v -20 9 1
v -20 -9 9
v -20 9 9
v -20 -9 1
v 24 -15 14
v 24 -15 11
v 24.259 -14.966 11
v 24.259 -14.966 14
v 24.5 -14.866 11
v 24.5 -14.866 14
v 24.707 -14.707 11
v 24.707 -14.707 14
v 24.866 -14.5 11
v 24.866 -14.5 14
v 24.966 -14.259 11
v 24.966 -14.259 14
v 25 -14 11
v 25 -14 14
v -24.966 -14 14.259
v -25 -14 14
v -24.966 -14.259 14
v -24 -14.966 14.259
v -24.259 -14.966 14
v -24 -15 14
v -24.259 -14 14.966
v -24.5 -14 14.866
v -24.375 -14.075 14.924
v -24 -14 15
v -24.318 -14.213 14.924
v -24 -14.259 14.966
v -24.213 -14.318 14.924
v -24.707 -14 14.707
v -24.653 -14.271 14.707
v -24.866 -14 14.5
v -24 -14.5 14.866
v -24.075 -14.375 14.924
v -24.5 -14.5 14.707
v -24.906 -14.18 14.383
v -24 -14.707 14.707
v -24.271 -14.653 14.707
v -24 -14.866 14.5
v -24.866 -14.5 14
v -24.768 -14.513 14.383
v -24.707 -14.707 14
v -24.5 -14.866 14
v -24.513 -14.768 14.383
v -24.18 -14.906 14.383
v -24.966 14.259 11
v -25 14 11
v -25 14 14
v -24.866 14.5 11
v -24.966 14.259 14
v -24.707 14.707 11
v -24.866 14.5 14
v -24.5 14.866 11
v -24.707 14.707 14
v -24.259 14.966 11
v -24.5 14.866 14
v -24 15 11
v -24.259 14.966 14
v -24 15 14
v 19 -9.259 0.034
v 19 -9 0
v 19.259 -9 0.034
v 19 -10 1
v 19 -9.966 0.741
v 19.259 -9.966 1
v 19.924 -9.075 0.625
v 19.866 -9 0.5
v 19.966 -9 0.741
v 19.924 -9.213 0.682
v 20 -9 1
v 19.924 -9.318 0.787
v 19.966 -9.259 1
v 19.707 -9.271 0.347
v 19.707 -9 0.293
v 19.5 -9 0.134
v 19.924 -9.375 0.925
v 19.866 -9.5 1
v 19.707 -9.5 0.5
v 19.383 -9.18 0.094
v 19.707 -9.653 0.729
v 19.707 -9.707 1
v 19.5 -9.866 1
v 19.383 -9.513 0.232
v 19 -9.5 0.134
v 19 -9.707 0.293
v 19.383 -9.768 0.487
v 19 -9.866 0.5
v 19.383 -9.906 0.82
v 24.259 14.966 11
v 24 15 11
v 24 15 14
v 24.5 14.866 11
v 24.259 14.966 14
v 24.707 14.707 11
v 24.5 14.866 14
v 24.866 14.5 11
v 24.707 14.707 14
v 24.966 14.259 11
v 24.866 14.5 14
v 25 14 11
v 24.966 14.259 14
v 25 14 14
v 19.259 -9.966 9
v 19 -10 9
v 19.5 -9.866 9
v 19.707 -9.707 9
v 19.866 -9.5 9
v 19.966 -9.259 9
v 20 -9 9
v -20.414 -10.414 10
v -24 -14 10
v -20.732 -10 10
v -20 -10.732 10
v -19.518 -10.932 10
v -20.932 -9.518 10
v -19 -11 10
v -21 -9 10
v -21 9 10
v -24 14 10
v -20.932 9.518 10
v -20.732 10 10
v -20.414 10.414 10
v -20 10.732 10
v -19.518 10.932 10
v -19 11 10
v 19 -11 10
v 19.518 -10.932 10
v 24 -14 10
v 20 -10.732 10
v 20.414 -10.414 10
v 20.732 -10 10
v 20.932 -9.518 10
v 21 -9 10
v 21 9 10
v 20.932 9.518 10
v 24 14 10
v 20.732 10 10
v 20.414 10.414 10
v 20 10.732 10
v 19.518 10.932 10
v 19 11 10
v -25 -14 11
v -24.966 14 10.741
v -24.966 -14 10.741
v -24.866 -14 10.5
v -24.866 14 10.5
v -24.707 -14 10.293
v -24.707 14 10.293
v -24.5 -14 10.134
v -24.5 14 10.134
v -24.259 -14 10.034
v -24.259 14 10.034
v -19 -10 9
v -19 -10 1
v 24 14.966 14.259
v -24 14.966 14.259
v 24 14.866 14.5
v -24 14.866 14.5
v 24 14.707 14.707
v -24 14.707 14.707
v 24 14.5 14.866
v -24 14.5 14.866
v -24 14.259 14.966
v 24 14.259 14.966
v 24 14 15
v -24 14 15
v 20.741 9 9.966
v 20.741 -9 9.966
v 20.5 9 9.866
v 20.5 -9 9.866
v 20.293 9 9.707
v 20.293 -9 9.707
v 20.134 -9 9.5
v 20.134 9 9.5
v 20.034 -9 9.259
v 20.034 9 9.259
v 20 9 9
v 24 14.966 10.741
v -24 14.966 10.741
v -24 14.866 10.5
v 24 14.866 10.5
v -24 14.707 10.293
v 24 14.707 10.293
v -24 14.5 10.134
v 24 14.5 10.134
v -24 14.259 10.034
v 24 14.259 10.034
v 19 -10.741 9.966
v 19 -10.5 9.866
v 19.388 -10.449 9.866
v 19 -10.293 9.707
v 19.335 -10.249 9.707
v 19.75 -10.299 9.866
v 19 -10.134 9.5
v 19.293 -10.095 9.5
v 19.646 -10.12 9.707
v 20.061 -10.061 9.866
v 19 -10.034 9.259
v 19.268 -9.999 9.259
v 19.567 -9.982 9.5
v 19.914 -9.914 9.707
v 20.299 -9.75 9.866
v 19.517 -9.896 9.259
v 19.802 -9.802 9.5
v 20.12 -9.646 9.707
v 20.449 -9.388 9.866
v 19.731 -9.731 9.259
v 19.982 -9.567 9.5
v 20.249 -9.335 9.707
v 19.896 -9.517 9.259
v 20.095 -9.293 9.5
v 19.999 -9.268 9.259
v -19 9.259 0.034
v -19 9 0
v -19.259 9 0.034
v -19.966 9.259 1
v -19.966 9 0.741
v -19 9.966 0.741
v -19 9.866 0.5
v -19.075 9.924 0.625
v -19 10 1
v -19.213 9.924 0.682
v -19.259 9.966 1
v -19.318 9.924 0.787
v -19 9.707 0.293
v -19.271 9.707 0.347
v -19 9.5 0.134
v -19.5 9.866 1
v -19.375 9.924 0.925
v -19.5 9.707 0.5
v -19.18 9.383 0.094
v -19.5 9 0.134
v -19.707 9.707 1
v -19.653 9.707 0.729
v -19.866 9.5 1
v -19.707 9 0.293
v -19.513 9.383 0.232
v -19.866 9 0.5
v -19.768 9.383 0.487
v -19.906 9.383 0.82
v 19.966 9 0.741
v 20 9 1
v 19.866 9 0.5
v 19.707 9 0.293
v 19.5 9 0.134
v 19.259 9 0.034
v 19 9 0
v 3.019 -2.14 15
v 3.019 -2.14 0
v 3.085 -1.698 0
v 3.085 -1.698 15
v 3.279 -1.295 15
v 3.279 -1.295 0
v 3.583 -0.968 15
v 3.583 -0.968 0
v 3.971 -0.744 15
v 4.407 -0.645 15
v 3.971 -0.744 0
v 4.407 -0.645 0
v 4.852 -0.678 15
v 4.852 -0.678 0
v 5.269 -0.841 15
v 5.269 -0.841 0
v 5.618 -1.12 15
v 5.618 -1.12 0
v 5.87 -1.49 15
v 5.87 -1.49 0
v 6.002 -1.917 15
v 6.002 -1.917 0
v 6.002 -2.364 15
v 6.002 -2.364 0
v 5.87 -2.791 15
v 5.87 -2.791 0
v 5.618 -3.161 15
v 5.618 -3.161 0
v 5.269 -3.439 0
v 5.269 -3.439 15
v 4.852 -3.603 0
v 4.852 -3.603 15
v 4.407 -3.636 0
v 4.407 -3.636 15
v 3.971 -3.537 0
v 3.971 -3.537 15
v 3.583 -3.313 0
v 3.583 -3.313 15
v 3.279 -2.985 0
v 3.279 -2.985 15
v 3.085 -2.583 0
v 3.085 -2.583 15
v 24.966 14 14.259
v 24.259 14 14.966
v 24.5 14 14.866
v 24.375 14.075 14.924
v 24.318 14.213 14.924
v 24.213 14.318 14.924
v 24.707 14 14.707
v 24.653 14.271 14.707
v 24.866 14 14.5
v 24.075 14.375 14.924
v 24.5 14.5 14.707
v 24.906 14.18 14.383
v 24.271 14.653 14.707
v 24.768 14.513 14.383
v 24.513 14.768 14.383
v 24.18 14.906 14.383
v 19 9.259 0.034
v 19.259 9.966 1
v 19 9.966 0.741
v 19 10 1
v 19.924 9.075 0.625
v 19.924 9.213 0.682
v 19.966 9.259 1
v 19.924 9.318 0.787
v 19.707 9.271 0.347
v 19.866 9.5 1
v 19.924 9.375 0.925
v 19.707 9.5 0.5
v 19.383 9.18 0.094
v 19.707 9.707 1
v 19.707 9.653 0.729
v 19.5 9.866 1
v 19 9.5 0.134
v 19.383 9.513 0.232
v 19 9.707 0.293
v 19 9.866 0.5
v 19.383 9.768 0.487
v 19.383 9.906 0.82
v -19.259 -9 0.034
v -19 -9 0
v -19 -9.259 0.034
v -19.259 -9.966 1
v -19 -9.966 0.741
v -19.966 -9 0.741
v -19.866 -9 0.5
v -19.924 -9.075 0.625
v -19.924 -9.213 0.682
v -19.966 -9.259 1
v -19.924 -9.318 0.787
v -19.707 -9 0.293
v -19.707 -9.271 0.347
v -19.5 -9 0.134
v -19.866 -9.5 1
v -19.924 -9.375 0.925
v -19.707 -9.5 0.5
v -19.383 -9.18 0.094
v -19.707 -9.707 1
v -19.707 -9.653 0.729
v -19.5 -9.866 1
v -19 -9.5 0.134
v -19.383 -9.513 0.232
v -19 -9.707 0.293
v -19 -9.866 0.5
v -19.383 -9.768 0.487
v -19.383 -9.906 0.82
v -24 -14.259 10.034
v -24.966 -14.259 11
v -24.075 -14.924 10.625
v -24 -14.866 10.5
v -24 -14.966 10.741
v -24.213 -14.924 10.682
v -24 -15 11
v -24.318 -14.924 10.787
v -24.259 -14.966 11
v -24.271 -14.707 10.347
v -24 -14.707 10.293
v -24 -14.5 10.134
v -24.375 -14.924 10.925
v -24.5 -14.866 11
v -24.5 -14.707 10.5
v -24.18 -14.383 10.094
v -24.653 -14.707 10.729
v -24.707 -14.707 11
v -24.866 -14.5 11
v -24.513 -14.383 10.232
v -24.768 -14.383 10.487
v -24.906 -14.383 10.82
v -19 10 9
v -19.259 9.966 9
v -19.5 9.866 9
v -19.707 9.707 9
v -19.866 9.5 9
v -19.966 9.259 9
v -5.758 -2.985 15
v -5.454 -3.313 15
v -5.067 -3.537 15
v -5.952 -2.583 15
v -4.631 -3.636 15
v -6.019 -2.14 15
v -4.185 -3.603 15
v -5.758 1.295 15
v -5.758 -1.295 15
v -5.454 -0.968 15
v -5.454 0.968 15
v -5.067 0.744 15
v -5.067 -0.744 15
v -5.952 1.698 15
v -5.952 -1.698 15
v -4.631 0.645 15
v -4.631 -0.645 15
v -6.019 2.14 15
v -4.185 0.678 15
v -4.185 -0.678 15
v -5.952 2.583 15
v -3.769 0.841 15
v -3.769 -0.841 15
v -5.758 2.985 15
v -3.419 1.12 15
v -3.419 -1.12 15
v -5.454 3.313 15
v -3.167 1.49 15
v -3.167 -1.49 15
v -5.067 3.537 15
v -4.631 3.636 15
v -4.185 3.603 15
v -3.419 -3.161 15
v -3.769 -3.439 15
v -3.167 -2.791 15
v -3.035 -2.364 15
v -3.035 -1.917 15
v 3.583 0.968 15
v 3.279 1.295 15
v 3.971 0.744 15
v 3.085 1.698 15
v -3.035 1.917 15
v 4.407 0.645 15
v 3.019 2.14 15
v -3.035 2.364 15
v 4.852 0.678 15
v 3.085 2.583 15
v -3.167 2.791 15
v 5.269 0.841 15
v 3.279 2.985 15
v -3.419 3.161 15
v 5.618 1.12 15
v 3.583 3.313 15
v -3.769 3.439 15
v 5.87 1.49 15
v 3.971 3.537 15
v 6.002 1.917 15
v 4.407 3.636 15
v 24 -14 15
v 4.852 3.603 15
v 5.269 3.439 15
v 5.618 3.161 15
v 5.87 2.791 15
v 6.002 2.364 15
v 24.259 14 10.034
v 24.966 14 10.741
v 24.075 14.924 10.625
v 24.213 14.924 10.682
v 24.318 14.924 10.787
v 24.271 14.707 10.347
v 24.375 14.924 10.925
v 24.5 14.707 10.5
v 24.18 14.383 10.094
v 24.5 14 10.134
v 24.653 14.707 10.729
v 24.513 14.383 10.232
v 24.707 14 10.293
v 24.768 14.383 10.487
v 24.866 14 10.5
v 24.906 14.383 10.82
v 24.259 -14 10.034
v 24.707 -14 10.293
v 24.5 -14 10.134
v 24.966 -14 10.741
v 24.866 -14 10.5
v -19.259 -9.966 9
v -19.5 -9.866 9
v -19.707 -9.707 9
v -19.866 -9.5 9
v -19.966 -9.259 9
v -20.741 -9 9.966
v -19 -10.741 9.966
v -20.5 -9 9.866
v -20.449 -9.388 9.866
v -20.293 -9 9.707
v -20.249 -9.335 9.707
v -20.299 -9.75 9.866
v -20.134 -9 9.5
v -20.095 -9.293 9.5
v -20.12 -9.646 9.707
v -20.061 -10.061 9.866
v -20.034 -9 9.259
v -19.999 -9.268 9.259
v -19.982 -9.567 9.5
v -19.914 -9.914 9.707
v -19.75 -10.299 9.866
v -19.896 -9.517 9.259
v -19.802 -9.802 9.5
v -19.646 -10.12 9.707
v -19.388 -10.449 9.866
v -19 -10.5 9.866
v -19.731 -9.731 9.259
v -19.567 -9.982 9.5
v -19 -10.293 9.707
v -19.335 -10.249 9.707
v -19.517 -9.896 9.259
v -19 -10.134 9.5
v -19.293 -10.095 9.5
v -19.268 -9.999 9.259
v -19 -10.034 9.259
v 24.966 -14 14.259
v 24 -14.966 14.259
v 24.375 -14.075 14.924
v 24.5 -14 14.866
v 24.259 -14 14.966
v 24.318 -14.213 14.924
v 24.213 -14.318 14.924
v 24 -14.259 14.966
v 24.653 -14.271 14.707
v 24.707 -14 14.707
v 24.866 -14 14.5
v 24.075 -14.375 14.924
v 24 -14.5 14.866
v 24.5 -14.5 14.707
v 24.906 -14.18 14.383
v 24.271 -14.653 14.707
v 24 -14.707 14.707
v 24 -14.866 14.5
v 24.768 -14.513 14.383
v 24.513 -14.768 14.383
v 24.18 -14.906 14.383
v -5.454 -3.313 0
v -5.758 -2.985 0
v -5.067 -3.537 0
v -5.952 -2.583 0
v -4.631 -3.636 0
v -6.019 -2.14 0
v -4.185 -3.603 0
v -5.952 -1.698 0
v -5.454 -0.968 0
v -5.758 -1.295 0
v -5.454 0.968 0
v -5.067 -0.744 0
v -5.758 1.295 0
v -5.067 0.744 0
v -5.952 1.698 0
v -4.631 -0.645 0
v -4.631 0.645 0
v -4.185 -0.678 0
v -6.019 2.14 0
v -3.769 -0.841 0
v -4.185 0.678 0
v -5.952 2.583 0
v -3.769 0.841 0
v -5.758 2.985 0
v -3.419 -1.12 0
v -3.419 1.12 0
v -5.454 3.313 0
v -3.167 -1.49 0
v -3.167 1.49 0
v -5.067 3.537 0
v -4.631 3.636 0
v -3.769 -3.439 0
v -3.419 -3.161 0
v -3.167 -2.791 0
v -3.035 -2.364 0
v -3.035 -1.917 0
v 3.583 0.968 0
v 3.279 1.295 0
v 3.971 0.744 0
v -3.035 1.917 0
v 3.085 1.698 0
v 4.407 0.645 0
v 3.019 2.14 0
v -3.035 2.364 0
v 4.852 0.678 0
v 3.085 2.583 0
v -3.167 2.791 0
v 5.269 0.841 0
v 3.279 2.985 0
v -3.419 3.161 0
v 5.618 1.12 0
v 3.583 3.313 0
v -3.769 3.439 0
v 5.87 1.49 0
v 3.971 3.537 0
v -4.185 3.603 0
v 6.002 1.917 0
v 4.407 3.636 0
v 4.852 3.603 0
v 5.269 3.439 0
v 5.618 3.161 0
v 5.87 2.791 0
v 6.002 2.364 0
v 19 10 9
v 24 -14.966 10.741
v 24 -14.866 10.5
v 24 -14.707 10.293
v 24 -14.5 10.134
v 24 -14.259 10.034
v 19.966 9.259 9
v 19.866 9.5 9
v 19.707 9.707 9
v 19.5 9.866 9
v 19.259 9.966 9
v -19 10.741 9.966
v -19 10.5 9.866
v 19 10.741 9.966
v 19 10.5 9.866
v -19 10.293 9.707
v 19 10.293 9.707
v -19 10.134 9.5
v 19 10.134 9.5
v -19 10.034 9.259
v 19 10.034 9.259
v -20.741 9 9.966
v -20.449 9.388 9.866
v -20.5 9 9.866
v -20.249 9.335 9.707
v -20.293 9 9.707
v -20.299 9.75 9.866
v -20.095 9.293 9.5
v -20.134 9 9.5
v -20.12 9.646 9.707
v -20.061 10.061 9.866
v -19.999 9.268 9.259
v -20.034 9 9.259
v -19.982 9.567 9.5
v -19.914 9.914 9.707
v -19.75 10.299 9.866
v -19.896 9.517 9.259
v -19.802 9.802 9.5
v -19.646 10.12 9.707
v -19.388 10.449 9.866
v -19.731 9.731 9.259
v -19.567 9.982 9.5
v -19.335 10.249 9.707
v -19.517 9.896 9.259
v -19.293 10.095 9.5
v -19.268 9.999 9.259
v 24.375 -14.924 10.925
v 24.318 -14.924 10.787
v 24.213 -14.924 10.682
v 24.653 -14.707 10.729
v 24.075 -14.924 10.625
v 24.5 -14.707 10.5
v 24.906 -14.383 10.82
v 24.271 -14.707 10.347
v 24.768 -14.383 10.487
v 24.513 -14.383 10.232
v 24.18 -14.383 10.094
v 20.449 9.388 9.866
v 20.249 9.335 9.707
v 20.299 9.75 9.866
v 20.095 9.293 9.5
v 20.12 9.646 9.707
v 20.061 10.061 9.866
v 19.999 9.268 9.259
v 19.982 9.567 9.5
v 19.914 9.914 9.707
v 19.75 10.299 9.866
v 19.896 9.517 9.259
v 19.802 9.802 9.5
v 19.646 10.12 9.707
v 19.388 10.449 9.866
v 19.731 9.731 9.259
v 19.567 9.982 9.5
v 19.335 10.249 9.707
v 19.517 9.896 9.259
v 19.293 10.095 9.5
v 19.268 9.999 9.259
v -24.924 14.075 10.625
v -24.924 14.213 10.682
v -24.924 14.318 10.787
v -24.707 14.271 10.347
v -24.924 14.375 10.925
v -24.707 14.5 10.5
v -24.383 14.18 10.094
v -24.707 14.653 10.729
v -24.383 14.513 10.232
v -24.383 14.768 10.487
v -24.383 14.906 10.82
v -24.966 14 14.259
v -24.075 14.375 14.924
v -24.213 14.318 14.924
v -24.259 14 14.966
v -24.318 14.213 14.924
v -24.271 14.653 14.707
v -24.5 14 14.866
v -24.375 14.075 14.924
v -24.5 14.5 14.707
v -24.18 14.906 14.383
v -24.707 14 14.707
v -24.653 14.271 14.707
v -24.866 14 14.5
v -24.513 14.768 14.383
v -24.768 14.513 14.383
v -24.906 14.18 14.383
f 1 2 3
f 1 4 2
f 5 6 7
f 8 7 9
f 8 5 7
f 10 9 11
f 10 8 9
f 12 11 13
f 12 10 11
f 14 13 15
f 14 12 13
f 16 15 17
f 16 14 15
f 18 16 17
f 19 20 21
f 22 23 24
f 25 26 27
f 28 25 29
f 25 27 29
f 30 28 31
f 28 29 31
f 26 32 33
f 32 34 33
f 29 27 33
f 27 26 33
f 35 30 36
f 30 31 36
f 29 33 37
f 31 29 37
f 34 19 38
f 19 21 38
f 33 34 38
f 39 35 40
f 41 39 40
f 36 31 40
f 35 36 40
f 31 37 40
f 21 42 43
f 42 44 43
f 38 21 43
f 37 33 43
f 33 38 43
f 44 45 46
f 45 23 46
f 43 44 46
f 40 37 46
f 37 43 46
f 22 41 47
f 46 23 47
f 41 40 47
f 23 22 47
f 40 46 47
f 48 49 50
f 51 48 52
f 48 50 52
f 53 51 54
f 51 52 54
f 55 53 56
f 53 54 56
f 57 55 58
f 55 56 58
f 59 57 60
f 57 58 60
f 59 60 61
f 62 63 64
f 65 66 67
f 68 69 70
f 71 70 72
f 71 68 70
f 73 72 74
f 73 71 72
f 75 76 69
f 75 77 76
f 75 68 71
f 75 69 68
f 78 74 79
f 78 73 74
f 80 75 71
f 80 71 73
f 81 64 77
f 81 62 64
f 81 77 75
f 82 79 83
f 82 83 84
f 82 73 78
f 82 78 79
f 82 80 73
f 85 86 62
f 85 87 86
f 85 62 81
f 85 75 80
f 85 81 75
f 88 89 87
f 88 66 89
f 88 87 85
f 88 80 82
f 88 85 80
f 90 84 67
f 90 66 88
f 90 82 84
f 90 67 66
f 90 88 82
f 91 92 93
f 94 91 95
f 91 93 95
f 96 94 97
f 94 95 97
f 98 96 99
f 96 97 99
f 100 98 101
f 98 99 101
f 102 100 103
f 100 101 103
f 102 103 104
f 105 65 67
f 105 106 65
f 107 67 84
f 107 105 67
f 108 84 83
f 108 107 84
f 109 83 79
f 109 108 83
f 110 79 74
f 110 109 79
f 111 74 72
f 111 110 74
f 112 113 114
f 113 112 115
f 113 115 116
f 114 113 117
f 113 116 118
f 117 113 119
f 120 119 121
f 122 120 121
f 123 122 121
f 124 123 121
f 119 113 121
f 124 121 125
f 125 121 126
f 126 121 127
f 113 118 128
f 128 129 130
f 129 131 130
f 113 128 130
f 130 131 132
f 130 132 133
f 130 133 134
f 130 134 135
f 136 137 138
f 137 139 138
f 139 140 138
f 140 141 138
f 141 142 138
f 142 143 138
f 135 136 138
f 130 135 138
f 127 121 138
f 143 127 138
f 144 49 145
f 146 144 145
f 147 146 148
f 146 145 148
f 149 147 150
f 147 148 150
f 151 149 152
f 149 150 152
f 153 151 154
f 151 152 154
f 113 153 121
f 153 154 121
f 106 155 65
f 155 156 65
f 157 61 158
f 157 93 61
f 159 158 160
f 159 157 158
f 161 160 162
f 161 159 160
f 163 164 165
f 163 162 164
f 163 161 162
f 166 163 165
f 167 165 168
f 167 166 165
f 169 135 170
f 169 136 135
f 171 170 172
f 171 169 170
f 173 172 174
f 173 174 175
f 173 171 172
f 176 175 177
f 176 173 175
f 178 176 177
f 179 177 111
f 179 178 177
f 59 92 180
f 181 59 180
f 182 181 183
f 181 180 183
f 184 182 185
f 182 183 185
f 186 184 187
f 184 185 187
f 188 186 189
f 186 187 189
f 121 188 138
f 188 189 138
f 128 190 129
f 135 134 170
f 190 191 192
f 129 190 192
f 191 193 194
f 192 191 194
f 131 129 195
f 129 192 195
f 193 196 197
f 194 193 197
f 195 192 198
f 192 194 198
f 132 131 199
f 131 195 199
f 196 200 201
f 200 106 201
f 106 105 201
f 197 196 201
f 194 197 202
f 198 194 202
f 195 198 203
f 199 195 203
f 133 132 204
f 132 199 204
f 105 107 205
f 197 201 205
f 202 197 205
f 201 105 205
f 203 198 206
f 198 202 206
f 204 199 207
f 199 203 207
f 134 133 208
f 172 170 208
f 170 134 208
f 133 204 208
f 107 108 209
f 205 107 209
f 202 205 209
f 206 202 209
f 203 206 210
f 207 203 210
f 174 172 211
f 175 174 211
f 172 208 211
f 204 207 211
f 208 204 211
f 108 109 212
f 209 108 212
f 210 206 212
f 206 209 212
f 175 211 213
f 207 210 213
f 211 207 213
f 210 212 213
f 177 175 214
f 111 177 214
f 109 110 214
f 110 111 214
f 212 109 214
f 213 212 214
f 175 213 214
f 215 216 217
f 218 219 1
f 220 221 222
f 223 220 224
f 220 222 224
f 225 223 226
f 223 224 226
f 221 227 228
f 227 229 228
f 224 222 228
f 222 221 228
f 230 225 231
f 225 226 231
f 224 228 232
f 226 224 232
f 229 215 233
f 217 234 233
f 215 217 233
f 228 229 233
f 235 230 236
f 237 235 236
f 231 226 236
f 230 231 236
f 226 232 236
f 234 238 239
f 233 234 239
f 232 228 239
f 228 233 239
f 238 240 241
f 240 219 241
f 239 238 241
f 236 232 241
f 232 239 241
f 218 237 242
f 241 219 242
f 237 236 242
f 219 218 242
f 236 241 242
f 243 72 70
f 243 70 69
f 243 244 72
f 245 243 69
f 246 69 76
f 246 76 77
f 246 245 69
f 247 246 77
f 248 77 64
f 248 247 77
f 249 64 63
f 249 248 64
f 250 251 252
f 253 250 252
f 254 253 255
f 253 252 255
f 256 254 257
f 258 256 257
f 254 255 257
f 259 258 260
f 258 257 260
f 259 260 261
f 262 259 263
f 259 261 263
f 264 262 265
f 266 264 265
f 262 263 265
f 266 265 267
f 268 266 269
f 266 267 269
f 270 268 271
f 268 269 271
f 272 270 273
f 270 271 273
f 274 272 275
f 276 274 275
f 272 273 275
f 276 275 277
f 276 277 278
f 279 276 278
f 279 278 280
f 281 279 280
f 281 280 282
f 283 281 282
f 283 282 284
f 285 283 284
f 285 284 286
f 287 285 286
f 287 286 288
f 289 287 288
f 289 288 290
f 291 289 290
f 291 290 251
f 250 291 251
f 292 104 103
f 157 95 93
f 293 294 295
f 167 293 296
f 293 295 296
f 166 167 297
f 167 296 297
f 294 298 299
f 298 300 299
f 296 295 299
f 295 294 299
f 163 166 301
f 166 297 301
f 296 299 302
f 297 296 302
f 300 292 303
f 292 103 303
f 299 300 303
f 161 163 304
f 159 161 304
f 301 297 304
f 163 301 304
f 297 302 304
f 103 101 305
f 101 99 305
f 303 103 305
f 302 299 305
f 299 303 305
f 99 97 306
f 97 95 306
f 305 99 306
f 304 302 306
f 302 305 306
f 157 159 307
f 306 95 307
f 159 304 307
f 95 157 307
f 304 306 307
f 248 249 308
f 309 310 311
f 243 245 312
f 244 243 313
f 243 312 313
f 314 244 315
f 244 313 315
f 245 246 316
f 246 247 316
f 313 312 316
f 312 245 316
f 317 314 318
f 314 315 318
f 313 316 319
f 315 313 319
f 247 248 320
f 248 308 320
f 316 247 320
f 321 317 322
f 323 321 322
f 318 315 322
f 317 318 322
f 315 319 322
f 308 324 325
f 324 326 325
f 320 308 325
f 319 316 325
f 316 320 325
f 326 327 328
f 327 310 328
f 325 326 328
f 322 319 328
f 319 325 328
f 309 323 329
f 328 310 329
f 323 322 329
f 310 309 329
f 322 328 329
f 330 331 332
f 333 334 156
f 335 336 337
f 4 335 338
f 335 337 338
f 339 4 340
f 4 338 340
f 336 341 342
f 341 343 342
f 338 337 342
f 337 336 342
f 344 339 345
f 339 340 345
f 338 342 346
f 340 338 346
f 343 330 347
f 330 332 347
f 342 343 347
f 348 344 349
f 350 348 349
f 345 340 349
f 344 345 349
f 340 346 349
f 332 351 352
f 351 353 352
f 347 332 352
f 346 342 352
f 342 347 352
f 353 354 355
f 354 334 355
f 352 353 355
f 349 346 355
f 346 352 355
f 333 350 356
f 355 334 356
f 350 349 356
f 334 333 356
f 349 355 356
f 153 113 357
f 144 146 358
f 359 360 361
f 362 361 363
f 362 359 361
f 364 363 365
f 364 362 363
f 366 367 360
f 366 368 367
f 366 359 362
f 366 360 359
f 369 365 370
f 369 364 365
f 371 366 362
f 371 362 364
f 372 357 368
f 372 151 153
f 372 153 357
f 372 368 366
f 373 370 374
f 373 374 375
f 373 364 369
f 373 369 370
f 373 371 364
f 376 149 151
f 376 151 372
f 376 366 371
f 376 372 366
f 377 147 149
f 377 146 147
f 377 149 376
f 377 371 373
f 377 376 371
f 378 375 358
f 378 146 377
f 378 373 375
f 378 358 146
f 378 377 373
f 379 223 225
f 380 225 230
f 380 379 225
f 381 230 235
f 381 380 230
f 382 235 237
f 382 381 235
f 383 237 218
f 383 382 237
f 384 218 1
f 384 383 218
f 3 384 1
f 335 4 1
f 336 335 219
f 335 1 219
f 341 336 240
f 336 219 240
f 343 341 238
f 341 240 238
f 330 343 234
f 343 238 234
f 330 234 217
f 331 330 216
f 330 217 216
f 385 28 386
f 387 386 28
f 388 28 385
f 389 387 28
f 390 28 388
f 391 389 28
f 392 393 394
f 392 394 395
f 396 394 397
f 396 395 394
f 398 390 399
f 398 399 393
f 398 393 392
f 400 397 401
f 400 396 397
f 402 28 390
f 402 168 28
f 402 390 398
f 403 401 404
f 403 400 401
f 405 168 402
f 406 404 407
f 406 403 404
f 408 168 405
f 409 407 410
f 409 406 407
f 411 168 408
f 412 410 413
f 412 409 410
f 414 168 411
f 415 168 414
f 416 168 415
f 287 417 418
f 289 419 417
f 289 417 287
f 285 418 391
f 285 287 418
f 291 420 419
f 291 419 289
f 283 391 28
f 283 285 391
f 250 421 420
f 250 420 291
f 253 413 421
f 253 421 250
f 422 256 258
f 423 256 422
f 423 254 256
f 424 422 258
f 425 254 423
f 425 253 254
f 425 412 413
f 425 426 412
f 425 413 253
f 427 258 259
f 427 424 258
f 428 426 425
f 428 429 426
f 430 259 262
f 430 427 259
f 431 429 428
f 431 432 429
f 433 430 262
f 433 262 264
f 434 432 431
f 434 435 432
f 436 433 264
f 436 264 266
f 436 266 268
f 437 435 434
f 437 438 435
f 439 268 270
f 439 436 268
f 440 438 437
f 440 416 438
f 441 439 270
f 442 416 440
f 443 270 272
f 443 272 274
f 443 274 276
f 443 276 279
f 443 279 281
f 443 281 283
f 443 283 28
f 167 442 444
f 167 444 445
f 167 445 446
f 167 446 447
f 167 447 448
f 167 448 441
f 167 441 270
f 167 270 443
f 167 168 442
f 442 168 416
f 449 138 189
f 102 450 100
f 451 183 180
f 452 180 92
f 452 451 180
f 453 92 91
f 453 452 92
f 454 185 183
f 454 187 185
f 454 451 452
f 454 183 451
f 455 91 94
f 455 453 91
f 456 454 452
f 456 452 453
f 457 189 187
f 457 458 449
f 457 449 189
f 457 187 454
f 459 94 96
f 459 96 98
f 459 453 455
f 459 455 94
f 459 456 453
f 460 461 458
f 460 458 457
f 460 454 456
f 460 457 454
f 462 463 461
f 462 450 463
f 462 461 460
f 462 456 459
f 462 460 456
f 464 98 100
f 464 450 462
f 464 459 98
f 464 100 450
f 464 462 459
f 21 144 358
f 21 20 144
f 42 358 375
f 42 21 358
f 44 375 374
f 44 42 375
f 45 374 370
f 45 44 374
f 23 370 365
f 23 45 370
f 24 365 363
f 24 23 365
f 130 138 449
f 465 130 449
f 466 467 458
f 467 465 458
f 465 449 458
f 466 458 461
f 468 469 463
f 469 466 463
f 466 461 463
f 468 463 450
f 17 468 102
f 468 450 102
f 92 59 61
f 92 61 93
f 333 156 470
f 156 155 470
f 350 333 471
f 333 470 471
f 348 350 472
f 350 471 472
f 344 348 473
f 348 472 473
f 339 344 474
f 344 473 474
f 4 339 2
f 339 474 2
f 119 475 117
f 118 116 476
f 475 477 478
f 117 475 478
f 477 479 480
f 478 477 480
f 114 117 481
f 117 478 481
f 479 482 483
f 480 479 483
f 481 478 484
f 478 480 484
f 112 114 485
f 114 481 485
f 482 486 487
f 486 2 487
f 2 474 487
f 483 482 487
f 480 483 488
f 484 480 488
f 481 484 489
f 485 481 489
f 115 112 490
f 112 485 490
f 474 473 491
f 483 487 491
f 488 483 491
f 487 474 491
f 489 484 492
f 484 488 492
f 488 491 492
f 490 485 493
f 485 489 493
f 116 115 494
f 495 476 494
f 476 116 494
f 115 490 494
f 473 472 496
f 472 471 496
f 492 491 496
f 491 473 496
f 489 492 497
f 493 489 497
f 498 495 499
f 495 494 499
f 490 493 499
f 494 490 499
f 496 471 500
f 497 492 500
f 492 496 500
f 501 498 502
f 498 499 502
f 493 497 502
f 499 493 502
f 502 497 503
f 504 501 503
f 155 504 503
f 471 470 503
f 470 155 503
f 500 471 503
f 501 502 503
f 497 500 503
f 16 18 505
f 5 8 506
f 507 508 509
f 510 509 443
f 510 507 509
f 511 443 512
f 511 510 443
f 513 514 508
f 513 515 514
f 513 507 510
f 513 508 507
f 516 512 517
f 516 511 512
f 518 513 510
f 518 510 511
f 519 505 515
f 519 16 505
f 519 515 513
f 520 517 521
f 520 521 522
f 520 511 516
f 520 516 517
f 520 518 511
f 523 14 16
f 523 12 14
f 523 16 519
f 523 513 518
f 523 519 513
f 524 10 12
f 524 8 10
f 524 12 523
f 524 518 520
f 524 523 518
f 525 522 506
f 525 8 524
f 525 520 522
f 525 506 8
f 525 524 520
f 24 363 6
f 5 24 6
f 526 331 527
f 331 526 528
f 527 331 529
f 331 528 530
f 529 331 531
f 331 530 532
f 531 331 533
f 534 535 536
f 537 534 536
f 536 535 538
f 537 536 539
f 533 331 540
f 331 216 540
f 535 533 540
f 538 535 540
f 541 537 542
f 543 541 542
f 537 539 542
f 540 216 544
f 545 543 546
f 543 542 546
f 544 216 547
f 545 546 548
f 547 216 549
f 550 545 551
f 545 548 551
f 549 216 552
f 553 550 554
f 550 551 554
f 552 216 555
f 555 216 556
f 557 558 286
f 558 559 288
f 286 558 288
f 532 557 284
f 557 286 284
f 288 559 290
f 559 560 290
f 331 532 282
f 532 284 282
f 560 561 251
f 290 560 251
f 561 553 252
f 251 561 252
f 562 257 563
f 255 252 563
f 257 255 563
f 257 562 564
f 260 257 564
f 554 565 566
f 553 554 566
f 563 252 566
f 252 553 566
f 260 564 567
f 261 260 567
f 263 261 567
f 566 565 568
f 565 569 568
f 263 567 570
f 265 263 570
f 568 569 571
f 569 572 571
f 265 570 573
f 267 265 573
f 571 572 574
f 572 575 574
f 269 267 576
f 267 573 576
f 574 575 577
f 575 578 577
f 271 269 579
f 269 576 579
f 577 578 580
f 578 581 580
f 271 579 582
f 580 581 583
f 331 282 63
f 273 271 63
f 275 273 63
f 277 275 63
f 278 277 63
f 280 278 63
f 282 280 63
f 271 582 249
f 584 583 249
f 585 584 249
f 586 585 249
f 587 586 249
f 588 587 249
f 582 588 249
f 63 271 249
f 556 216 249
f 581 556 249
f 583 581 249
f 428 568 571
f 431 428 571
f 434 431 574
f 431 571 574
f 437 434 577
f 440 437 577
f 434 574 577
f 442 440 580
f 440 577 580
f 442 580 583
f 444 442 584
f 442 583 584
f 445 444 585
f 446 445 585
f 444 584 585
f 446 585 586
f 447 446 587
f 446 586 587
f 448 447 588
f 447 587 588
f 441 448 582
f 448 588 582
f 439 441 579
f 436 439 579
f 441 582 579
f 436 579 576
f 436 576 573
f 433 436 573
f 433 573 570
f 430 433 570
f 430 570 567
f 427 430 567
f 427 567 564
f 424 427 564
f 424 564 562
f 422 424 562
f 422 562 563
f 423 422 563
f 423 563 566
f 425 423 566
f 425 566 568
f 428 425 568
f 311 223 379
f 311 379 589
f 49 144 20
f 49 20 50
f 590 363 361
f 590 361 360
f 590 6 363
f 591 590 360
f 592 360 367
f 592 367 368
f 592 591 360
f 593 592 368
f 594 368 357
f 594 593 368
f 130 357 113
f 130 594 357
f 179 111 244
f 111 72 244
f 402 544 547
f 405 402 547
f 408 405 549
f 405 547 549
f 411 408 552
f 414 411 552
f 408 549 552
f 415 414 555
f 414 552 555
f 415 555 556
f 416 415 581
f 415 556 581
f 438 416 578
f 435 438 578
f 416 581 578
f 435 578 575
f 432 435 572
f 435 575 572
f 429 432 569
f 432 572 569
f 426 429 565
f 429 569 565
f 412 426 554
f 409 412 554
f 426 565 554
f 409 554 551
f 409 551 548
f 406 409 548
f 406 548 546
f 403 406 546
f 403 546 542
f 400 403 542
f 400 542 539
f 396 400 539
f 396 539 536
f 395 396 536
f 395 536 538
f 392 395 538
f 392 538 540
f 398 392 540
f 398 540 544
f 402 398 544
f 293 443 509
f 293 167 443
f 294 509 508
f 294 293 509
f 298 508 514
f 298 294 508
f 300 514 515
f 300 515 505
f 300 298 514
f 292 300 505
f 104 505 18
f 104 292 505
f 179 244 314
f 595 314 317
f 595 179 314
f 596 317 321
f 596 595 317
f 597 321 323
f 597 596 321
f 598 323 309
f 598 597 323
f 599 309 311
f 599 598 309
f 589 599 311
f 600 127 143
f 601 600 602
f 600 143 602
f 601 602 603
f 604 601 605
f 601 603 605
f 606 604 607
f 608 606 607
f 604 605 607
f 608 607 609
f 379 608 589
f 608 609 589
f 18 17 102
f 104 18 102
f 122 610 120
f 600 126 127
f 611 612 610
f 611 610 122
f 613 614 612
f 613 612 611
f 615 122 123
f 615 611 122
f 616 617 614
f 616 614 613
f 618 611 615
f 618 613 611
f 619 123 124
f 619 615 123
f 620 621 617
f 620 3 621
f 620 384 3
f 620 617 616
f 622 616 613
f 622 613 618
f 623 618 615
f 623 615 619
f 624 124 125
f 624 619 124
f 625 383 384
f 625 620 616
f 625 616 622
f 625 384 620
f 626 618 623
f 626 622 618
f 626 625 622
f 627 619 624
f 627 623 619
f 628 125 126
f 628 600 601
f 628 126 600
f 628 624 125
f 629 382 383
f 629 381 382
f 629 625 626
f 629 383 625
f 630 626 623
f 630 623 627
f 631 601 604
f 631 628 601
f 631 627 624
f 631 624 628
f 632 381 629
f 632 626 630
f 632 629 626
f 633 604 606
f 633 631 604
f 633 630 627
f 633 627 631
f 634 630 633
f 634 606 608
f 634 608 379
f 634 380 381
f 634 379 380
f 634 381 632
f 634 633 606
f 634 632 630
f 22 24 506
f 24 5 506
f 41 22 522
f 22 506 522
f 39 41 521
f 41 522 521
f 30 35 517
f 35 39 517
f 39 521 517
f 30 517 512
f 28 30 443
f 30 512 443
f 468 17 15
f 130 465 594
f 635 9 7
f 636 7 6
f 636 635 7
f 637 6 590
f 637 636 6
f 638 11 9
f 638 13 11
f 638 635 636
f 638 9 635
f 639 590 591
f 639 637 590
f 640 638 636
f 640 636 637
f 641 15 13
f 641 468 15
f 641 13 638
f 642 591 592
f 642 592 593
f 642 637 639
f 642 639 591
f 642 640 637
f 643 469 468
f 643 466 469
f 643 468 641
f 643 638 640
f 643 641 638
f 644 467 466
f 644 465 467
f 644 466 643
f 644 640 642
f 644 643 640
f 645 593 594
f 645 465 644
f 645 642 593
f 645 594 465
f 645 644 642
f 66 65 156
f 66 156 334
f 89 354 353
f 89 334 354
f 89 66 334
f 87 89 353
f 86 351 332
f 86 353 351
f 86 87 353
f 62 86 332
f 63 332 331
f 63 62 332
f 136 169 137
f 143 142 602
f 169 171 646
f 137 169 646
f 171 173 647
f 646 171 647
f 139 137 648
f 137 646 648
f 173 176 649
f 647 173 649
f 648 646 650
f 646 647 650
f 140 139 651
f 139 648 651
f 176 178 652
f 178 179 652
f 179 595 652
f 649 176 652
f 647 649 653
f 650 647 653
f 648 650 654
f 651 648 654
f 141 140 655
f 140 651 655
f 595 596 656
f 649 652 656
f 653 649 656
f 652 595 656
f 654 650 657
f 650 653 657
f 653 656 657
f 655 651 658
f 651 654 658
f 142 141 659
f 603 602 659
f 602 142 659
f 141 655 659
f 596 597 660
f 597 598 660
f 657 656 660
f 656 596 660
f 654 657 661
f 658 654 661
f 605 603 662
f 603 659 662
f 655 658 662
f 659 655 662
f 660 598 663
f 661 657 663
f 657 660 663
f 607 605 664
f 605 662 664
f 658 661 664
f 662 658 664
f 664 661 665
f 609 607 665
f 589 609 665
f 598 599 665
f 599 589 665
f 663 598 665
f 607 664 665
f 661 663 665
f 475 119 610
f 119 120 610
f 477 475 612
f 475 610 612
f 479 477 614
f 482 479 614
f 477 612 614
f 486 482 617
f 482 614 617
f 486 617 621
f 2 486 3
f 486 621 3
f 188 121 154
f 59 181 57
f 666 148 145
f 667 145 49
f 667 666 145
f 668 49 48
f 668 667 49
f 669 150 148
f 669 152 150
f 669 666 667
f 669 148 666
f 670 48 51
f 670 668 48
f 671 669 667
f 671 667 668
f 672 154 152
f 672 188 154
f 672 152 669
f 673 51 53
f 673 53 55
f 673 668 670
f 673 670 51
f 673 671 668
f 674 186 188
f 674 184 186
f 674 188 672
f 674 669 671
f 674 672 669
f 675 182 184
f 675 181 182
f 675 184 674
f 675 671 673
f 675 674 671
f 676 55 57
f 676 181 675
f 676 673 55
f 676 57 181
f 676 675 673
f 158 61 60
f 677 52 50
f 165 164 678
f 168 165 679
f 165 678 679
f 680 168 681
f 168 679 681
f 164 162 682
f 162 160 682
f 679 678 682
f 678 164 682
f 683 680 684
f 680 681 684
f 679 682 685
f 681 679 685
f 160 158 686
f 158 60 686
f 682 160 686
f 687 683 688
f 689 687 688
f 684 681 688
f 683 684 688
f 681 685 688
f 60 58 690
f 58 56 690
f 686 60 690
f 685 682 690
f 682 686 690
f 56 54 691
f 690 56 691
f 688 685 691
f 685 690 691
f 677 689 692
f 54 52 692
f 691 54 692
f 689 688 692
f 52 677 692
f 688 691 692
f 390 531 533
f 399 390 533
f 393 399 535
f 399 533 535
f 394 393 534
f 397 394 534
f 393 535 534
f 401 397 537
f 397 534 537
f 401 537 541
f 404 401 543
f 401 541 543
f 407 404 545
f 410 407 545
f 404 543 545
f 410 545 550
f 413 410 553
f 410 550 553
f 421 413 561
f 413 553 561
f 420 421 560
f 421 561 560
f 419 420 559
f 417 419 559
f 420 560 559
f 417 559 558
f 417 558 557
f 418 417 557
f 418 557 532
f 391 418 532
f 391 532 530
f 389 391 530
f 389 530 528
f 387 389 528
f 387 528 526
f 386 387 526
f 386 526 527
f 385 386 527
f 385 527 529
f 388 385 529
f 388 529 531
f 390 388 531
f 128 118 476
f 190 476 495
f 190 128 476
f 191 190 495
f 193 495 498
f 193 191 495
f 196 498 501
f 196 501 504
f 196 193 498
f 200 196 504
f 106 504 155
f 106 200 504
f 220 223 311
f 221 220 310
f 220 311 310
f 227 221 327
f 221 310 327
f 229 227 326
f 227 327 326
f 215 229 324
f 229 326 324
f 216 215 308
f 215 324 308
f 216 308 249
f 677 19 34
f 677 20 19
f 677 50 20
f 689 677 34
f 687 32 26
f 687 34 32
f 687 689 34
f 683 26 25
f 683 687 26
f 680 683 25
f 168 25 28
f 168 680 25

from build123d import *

# Parameters (mm, degrees)
SKETCH_1_W          = 40
SKETCH_1_H          = 20
EXTRUDE_1_DEPTH     = 10
SKETCH_2_W          = 50
SKETCH_2_H          = 30
EXTRUDE_2_DEPTH     = 5
FILLET_1_R          = 1
SKETCH_3_R          = 1.5
CUT_EXTRUDE_1_DEPTH = 33.787192622


with BuildPart() as part:
    # 草图1 → 凸台-拉伸1 (new body)
    with BuildSketch(Plane.XY):
        Rectangle(SKETCH_1_W, SKETCH_1_H)
    extrude(amount=EXTRUDE_1_DEPTH)

    # 草图2 → 凸台-拉伸2 (add)
    with BuildSketch(Plane.XY.offset(10)):
        Rectangle(SKETCH_2_W, SKETCH_2_H)
    extrude(amount=EXTRUDE_2_DEPTH)

    # 圆角1
    fillet_1_edges = [part.edges().sort_by_distance(p)[0] for p in [
        (-20, 0, 10),
        (0, -10, 10),
        (25, 0, 10),
        (25, -15, 12.5),
        (0, 15, 10),
        (25, 15, 12.5),
        (-25, 0, 10),
        (-25, 15, 12.5),
        (0, -15, 10),
        (-25, -15, 12.5),
        (25, 0, 15),
        (0, 15, 15),
        (-25, 0, 15),
        (0, -15, 15),
        (20, 0, 10),
        (0, -10, 0),
        (-20, 0, 0),
        (0, 10, 0),
        (20, 0, 0),
        (0, 10, 10),
        (20, -10, 5),
        (-20, -10, 5),
        (-20, 10, 5),
        (20, 10, 5),
    ]]
    fillet(fillet_1_edges, radius=FILLET_1_R)

    # 草图3 → 切除-拉伸1 (cut, through all)
    with BuildSketch(Plane(origin=(0, 0, 0), x_dir=(-1, 0, 0), z_dir=(0, 0, -1))):
        with Locations((-4.518689194, -2.140431724)):
            Circle(SKETCH_3_R)
        with Locations((4.518689194, 2.140431724)):
            Circle(SKETCH_3_R)
        with Locations((-4.518689194, 2.140431724)):
            Circle(SKETCH_3_R)
        with Locations((4.518689194, -2.140431724)):
            Circle(SKETCH_3_R)
    extrude(amount=-CUT_EXTRUDE_1_DEPTH, mode=Mode.SUBTRACT)


solid = part.part
